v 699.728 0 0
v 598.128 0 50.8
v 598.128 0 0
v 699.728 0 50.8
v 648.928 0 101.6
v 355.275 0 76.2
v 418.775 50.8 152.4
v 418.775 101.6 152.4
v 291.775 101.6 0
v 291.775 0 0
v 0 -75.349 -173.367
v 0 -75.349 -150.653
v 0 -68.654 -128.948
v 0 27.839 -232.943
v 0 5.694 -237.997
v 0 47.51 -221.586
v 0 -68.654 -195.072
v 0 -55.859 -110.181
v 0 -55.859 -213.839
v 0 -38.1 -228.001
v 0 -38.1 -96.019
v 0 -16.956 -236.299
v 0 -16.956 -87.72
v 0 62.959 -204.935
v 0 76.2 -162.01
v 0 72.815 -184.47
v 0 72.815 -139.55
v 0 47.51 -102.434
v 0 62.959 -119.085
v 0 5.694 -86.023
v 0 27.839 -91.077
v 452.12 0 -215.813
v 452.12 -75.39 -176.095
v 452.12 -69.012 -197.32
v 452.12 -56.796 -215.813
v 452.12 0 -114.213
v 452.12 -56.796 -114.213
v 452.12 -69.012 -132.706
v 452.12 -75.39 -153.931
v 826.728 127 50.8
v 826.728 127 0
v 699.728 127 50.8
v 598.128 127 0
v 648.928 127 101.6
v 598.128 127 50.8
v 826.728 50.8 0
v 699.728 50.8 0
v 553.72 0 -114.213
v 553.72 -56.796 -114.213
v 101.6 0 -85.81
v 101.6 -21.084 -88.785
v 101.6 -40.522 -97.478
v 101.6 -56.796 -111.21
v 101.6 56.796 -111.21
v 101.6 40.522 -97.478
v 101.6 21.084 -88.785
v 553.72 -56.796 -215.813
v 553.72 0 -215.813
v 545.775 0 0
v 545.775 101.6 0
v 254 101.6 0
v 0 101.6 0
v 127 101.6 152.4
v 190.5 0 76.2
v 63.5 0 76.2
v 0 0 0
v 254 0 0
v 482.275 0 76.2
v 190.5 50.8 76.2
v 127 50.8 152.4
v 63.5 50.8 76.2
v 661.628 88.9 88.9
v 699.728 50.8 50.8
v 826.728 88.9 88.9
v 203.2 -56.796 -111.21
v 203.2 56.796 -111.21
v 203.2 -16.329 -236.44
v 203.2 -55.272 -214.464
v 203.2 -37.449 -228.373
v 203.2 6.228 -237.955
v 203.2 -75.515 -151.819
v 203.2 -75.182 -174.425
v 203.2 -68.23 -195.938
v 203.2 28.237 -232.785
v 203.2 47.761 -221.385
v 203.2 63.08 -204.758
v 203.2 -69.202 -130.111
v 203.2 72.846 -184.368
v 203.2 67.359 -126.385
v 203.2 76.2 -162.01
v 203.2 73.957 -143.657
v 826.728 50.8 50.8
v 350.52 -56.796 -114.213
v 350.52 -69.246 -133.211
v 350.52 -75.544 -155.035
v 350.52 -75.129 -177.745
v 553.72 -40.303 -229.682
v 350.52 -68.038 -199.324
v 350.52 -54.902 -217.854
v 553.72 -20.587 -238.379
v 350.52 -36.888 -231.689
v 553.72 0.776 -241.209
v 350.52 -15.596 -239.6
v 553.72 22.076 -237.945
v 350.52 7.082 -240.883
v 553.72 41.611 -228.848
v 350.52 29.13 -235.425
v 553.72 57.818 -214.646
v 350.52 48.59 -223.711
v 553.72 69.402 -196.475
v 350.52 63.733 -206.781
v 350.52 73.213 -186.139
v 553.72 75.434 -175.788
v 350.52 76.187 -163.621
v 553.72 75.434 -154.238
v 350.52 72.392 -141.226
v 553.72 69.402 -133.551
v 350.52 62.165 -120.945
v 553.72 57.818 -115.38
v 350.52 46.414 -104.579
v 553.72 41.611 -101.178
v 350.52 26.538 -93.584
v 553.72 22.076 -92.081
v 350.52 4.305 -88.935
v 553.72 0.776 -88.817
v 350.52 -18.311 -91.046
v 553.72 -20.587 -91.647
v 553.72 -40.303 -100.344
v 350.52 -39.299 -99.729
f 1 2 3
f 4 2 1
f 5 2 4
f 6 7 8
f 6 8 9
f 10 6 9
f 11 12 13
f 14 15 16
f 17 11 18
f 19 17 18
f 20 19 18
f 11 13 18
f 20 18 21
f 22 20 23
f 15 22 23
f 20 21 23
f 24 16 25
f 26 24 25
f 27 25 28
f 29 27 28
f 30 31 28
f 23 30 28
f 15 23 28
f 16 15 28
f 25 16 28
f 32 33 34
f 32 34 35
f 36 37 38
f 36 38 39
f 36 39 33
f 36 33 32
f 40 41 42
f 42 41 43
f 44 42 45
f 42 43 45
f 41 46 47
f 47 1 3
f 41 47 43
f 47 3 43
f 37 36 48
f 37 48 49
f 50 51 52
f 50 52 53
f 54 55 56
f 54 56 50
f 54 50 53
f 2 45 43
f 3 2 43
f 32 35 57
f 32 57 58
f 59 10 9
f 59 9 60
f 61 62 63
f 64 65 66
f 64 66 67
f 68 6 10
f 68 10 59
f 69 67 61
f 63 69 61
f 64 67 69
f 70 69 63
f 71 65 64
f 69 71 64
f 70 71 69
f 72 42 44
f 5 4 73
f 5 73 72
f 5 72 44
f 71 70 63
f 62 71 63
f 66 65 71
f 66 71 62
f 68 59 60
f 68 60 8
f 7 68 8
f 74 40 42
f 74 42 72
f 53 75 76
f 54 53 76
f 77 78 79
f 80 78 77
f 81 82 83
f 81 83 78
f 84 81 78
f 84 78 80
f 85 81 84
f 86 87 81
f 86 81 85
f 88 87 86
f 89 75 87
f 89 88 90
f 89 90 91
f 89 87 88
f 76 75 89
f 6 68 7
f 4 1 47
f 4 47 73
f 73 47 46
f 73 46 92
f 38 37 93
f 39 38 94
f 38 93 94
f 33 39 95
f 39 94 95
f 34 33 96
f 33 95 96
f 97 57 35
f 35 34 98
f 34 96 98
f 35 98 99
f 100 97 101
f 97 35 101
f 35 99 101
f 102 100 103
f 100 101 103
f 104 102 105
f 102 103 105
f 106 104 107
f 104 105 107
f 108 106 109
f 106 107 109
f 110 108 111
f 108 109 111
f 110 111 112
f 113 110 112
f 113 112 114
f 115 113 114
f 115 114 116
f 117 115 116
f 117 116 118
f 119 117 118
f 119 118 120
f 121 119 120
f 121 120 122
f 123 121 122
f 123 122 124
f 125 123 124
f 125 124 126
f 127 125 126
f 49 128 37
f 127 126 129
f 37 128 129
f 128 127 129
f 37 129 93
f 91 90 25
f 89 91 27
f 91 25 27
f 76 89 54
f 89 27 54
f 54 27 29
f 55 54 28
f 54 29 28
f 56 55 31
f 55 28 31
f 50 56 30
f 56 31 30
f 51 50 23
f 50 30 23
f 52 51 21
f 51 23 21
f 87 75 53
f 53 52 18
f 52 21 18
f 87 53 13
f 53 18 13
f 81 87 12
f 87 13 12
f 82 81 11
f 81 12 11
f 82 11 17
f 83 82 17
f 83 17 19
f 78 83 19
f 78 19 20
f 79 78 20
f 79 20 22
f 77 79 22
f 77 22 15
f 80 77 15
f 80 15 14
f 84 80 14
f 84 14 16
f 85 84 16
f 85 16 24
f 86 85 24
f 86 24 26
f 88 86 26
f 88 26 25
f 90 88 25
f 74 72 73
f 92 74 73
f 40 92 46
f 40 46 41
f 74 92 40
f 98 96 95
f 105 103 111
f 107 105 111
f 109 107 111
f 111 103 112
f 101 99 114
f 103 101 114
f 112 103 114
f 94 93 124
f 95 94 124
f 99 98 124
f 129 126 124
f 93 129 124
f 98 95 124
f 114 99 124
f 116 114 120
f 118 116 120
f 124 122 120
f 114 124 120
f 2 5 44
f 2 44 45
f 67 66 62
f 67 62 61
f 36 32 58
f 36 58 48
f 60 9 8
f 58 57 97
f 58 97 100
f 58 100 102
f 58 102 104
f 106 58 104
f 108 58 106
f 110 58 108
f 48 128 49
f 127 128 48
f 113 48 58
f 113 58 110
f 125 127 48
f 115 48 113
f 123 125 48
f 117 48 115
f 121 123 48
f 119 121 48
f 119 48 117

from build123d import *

# Parameters (mm, degrees)
F1_DEPTH  = 101.6
F3_DEPTH  = 50.8
F5_DEPTH  = 101.6
F8_DEPTH  = 244.348
F10_DEPTH = 127
F11_W     = 76.2
F11_H     = 50.8
F12_DEPTH = 127
F14_R     = 76.2
F15_DEPTH = 203.2
F17_DEPTH = 101.6
F20_DEPTH = 203.2
F22_DEPTH = 101.6


with BuildPart() as f1:
    # F0 (on Front) → F1 (new body)
    with BuildSketch(Plane.XZ):
        Polygon((127, 152.4), (0, 0), (254, 0), align=None)
    extrude(amount=-F1_DEPTH)

    # F2 (on face) → F3 (cut)
    with BuildSketch(Plane.XZ):
        Polygon((63.5, 76.2), (127, 76.2), (190.5, 76.2), (127, 152.4), align=None)
    extrude(amount=-F3_DEPTH, mode=Mode.SUBTRACT)


with BuildPart() as f5:
    # F4 (on Front) → F5 (new body)
    with BuildSketch(Plane.XZ):
        Polygon((418.7748224481, 152.4), (291.7748224481, 0), (545.7748224481, 0), align=None)
    extrude(amount=-F5_DEPTH)

    # F7 (on offset) → F8 (cut)
    with BuildSketch(Plane.YZ.offset(550.672)):
        Polygon((0, 152.4), (0, 76.2), (50.8, 152.4), align=None)
    extrude(amount=-F8_DEPTH, mode=Mode.SUBTRACT)


with BuildPart() as f10:
    # F9 (on Front) → F10 (new body)
    with BuildSketch(Plane.XZ):
        Polygon((598.1282820559, 50.8), (598.1282820559, 0), (699.7282820559, 0), (699.7282820559, 50.8), (648.9282820559, 101.6), align=None)
    extrude(amount=-F10_DEPTH)

    # F11 (on face) → F12 (join)
    with BuildSketch(Plane.YZ.offset(699.7282820559)):
        with Locations((88.9, 25.4)):
            Rectangle(F11_W, F11_H)
        Polygon((50.8, 50.8), (127, 50.8), (88.9, 88.9), align=None)
    extrude(amount=F12_DEPTH)

    # F11 (on face) → F13 (join, up to the next surface of F10)
    with BuildSketch(Plane.YZ.offset(699.7282820559)):
        Polygon((50.8, 50.8), (127, 50.8), (88.9, 88.9), align=None)
    extrude(until=Until.NEXT, dir=(-1, 0, 0))


with BuildPart() as f15:
    # F14 (on Right) → F15 (new body)
    with BuildSketch(Plane.YZ):
        with Locations((0, -162.0099643456)):
            Circle(F14_R)
    extrude(amount=F15_DEPTH)

    # F16 (on face) → F17 (cut)
    with BuildSketch(Plane.YZ.offset(203.2)):
        with BuildLine():
            Line((-56.7961266285, -111.2099643456), (56.7961266285, -111.2099643456))
            ThreePointArc((56.7961266285, -111.2099643456), (0, -85.8099643456), (-56.7961266285, -111.2099643456))
        make_face()
    extrude(amount=-F17_DEPTH, mode=Mode.SUBTRACT)


with BuildPart() as f20:
    # F19 (on offset) → F20 (new body)
    with BuildSketch(Plane.YZ.offset(350.52)):
        with BuildLine():
            ThreePointArc((-56.7961266285, -215.8130525019), (27.1898432407, -236.1969862549), (76.2, -165.0130525019))
            ThreePointArc((76.2, -165.0130525019), (27.1898432407, -93.829118749), (-56.7961266285, -114.2130525019))
            Line((-56.7961266285, -114.2130525019), (0, -114.2130525019))
            Line((0, -114.2130525019), (0, -215.8130525019))
            Line((0, -215.8130525019), (-56.7961266285, -215.8130525019))
        make_face()
        with BuildLine():
            Line((0, -114.2130525019), (-56.7961266285, -114.2130525019))
            ThreePointArc((-56.7961266285, -114.2130525019), (-76.2, -165.0130525019), (-56.7961266285, -215.8130525019))
            Line((-56.7961266285, -215.8130525019), (0, -215.8130525019))
            Line((0, -215.8130525019), (0, -114.2130525019))
        make_face()
    extrude(amount=F20_DEPTH)

    # F21 (on face) → F22 (cut)
    with BuildSketch(Plane.YZ.offset(553.72)):
        with BuildLine():
            Line((0, -215.8130525019), (0, -114.2130525019))
            Line((0, -114.2130525019), (-56.7961266285, -114.2130525019))
            ThreePointArc((-56.7961266285, -114.2130525019), (-76.2, -165.0130525019), (-56.7961266285, -215.8130525019))
            Line((-56.7961266285, -215.8130525019), (0, -215.8130525019))
        make_face()
    extrude(amount=-F22_DEPTH, mode=Mode.SUBTRACT)


solid = Compound([f1.part, f5.part, f10.part, f15.part, f20.part])
